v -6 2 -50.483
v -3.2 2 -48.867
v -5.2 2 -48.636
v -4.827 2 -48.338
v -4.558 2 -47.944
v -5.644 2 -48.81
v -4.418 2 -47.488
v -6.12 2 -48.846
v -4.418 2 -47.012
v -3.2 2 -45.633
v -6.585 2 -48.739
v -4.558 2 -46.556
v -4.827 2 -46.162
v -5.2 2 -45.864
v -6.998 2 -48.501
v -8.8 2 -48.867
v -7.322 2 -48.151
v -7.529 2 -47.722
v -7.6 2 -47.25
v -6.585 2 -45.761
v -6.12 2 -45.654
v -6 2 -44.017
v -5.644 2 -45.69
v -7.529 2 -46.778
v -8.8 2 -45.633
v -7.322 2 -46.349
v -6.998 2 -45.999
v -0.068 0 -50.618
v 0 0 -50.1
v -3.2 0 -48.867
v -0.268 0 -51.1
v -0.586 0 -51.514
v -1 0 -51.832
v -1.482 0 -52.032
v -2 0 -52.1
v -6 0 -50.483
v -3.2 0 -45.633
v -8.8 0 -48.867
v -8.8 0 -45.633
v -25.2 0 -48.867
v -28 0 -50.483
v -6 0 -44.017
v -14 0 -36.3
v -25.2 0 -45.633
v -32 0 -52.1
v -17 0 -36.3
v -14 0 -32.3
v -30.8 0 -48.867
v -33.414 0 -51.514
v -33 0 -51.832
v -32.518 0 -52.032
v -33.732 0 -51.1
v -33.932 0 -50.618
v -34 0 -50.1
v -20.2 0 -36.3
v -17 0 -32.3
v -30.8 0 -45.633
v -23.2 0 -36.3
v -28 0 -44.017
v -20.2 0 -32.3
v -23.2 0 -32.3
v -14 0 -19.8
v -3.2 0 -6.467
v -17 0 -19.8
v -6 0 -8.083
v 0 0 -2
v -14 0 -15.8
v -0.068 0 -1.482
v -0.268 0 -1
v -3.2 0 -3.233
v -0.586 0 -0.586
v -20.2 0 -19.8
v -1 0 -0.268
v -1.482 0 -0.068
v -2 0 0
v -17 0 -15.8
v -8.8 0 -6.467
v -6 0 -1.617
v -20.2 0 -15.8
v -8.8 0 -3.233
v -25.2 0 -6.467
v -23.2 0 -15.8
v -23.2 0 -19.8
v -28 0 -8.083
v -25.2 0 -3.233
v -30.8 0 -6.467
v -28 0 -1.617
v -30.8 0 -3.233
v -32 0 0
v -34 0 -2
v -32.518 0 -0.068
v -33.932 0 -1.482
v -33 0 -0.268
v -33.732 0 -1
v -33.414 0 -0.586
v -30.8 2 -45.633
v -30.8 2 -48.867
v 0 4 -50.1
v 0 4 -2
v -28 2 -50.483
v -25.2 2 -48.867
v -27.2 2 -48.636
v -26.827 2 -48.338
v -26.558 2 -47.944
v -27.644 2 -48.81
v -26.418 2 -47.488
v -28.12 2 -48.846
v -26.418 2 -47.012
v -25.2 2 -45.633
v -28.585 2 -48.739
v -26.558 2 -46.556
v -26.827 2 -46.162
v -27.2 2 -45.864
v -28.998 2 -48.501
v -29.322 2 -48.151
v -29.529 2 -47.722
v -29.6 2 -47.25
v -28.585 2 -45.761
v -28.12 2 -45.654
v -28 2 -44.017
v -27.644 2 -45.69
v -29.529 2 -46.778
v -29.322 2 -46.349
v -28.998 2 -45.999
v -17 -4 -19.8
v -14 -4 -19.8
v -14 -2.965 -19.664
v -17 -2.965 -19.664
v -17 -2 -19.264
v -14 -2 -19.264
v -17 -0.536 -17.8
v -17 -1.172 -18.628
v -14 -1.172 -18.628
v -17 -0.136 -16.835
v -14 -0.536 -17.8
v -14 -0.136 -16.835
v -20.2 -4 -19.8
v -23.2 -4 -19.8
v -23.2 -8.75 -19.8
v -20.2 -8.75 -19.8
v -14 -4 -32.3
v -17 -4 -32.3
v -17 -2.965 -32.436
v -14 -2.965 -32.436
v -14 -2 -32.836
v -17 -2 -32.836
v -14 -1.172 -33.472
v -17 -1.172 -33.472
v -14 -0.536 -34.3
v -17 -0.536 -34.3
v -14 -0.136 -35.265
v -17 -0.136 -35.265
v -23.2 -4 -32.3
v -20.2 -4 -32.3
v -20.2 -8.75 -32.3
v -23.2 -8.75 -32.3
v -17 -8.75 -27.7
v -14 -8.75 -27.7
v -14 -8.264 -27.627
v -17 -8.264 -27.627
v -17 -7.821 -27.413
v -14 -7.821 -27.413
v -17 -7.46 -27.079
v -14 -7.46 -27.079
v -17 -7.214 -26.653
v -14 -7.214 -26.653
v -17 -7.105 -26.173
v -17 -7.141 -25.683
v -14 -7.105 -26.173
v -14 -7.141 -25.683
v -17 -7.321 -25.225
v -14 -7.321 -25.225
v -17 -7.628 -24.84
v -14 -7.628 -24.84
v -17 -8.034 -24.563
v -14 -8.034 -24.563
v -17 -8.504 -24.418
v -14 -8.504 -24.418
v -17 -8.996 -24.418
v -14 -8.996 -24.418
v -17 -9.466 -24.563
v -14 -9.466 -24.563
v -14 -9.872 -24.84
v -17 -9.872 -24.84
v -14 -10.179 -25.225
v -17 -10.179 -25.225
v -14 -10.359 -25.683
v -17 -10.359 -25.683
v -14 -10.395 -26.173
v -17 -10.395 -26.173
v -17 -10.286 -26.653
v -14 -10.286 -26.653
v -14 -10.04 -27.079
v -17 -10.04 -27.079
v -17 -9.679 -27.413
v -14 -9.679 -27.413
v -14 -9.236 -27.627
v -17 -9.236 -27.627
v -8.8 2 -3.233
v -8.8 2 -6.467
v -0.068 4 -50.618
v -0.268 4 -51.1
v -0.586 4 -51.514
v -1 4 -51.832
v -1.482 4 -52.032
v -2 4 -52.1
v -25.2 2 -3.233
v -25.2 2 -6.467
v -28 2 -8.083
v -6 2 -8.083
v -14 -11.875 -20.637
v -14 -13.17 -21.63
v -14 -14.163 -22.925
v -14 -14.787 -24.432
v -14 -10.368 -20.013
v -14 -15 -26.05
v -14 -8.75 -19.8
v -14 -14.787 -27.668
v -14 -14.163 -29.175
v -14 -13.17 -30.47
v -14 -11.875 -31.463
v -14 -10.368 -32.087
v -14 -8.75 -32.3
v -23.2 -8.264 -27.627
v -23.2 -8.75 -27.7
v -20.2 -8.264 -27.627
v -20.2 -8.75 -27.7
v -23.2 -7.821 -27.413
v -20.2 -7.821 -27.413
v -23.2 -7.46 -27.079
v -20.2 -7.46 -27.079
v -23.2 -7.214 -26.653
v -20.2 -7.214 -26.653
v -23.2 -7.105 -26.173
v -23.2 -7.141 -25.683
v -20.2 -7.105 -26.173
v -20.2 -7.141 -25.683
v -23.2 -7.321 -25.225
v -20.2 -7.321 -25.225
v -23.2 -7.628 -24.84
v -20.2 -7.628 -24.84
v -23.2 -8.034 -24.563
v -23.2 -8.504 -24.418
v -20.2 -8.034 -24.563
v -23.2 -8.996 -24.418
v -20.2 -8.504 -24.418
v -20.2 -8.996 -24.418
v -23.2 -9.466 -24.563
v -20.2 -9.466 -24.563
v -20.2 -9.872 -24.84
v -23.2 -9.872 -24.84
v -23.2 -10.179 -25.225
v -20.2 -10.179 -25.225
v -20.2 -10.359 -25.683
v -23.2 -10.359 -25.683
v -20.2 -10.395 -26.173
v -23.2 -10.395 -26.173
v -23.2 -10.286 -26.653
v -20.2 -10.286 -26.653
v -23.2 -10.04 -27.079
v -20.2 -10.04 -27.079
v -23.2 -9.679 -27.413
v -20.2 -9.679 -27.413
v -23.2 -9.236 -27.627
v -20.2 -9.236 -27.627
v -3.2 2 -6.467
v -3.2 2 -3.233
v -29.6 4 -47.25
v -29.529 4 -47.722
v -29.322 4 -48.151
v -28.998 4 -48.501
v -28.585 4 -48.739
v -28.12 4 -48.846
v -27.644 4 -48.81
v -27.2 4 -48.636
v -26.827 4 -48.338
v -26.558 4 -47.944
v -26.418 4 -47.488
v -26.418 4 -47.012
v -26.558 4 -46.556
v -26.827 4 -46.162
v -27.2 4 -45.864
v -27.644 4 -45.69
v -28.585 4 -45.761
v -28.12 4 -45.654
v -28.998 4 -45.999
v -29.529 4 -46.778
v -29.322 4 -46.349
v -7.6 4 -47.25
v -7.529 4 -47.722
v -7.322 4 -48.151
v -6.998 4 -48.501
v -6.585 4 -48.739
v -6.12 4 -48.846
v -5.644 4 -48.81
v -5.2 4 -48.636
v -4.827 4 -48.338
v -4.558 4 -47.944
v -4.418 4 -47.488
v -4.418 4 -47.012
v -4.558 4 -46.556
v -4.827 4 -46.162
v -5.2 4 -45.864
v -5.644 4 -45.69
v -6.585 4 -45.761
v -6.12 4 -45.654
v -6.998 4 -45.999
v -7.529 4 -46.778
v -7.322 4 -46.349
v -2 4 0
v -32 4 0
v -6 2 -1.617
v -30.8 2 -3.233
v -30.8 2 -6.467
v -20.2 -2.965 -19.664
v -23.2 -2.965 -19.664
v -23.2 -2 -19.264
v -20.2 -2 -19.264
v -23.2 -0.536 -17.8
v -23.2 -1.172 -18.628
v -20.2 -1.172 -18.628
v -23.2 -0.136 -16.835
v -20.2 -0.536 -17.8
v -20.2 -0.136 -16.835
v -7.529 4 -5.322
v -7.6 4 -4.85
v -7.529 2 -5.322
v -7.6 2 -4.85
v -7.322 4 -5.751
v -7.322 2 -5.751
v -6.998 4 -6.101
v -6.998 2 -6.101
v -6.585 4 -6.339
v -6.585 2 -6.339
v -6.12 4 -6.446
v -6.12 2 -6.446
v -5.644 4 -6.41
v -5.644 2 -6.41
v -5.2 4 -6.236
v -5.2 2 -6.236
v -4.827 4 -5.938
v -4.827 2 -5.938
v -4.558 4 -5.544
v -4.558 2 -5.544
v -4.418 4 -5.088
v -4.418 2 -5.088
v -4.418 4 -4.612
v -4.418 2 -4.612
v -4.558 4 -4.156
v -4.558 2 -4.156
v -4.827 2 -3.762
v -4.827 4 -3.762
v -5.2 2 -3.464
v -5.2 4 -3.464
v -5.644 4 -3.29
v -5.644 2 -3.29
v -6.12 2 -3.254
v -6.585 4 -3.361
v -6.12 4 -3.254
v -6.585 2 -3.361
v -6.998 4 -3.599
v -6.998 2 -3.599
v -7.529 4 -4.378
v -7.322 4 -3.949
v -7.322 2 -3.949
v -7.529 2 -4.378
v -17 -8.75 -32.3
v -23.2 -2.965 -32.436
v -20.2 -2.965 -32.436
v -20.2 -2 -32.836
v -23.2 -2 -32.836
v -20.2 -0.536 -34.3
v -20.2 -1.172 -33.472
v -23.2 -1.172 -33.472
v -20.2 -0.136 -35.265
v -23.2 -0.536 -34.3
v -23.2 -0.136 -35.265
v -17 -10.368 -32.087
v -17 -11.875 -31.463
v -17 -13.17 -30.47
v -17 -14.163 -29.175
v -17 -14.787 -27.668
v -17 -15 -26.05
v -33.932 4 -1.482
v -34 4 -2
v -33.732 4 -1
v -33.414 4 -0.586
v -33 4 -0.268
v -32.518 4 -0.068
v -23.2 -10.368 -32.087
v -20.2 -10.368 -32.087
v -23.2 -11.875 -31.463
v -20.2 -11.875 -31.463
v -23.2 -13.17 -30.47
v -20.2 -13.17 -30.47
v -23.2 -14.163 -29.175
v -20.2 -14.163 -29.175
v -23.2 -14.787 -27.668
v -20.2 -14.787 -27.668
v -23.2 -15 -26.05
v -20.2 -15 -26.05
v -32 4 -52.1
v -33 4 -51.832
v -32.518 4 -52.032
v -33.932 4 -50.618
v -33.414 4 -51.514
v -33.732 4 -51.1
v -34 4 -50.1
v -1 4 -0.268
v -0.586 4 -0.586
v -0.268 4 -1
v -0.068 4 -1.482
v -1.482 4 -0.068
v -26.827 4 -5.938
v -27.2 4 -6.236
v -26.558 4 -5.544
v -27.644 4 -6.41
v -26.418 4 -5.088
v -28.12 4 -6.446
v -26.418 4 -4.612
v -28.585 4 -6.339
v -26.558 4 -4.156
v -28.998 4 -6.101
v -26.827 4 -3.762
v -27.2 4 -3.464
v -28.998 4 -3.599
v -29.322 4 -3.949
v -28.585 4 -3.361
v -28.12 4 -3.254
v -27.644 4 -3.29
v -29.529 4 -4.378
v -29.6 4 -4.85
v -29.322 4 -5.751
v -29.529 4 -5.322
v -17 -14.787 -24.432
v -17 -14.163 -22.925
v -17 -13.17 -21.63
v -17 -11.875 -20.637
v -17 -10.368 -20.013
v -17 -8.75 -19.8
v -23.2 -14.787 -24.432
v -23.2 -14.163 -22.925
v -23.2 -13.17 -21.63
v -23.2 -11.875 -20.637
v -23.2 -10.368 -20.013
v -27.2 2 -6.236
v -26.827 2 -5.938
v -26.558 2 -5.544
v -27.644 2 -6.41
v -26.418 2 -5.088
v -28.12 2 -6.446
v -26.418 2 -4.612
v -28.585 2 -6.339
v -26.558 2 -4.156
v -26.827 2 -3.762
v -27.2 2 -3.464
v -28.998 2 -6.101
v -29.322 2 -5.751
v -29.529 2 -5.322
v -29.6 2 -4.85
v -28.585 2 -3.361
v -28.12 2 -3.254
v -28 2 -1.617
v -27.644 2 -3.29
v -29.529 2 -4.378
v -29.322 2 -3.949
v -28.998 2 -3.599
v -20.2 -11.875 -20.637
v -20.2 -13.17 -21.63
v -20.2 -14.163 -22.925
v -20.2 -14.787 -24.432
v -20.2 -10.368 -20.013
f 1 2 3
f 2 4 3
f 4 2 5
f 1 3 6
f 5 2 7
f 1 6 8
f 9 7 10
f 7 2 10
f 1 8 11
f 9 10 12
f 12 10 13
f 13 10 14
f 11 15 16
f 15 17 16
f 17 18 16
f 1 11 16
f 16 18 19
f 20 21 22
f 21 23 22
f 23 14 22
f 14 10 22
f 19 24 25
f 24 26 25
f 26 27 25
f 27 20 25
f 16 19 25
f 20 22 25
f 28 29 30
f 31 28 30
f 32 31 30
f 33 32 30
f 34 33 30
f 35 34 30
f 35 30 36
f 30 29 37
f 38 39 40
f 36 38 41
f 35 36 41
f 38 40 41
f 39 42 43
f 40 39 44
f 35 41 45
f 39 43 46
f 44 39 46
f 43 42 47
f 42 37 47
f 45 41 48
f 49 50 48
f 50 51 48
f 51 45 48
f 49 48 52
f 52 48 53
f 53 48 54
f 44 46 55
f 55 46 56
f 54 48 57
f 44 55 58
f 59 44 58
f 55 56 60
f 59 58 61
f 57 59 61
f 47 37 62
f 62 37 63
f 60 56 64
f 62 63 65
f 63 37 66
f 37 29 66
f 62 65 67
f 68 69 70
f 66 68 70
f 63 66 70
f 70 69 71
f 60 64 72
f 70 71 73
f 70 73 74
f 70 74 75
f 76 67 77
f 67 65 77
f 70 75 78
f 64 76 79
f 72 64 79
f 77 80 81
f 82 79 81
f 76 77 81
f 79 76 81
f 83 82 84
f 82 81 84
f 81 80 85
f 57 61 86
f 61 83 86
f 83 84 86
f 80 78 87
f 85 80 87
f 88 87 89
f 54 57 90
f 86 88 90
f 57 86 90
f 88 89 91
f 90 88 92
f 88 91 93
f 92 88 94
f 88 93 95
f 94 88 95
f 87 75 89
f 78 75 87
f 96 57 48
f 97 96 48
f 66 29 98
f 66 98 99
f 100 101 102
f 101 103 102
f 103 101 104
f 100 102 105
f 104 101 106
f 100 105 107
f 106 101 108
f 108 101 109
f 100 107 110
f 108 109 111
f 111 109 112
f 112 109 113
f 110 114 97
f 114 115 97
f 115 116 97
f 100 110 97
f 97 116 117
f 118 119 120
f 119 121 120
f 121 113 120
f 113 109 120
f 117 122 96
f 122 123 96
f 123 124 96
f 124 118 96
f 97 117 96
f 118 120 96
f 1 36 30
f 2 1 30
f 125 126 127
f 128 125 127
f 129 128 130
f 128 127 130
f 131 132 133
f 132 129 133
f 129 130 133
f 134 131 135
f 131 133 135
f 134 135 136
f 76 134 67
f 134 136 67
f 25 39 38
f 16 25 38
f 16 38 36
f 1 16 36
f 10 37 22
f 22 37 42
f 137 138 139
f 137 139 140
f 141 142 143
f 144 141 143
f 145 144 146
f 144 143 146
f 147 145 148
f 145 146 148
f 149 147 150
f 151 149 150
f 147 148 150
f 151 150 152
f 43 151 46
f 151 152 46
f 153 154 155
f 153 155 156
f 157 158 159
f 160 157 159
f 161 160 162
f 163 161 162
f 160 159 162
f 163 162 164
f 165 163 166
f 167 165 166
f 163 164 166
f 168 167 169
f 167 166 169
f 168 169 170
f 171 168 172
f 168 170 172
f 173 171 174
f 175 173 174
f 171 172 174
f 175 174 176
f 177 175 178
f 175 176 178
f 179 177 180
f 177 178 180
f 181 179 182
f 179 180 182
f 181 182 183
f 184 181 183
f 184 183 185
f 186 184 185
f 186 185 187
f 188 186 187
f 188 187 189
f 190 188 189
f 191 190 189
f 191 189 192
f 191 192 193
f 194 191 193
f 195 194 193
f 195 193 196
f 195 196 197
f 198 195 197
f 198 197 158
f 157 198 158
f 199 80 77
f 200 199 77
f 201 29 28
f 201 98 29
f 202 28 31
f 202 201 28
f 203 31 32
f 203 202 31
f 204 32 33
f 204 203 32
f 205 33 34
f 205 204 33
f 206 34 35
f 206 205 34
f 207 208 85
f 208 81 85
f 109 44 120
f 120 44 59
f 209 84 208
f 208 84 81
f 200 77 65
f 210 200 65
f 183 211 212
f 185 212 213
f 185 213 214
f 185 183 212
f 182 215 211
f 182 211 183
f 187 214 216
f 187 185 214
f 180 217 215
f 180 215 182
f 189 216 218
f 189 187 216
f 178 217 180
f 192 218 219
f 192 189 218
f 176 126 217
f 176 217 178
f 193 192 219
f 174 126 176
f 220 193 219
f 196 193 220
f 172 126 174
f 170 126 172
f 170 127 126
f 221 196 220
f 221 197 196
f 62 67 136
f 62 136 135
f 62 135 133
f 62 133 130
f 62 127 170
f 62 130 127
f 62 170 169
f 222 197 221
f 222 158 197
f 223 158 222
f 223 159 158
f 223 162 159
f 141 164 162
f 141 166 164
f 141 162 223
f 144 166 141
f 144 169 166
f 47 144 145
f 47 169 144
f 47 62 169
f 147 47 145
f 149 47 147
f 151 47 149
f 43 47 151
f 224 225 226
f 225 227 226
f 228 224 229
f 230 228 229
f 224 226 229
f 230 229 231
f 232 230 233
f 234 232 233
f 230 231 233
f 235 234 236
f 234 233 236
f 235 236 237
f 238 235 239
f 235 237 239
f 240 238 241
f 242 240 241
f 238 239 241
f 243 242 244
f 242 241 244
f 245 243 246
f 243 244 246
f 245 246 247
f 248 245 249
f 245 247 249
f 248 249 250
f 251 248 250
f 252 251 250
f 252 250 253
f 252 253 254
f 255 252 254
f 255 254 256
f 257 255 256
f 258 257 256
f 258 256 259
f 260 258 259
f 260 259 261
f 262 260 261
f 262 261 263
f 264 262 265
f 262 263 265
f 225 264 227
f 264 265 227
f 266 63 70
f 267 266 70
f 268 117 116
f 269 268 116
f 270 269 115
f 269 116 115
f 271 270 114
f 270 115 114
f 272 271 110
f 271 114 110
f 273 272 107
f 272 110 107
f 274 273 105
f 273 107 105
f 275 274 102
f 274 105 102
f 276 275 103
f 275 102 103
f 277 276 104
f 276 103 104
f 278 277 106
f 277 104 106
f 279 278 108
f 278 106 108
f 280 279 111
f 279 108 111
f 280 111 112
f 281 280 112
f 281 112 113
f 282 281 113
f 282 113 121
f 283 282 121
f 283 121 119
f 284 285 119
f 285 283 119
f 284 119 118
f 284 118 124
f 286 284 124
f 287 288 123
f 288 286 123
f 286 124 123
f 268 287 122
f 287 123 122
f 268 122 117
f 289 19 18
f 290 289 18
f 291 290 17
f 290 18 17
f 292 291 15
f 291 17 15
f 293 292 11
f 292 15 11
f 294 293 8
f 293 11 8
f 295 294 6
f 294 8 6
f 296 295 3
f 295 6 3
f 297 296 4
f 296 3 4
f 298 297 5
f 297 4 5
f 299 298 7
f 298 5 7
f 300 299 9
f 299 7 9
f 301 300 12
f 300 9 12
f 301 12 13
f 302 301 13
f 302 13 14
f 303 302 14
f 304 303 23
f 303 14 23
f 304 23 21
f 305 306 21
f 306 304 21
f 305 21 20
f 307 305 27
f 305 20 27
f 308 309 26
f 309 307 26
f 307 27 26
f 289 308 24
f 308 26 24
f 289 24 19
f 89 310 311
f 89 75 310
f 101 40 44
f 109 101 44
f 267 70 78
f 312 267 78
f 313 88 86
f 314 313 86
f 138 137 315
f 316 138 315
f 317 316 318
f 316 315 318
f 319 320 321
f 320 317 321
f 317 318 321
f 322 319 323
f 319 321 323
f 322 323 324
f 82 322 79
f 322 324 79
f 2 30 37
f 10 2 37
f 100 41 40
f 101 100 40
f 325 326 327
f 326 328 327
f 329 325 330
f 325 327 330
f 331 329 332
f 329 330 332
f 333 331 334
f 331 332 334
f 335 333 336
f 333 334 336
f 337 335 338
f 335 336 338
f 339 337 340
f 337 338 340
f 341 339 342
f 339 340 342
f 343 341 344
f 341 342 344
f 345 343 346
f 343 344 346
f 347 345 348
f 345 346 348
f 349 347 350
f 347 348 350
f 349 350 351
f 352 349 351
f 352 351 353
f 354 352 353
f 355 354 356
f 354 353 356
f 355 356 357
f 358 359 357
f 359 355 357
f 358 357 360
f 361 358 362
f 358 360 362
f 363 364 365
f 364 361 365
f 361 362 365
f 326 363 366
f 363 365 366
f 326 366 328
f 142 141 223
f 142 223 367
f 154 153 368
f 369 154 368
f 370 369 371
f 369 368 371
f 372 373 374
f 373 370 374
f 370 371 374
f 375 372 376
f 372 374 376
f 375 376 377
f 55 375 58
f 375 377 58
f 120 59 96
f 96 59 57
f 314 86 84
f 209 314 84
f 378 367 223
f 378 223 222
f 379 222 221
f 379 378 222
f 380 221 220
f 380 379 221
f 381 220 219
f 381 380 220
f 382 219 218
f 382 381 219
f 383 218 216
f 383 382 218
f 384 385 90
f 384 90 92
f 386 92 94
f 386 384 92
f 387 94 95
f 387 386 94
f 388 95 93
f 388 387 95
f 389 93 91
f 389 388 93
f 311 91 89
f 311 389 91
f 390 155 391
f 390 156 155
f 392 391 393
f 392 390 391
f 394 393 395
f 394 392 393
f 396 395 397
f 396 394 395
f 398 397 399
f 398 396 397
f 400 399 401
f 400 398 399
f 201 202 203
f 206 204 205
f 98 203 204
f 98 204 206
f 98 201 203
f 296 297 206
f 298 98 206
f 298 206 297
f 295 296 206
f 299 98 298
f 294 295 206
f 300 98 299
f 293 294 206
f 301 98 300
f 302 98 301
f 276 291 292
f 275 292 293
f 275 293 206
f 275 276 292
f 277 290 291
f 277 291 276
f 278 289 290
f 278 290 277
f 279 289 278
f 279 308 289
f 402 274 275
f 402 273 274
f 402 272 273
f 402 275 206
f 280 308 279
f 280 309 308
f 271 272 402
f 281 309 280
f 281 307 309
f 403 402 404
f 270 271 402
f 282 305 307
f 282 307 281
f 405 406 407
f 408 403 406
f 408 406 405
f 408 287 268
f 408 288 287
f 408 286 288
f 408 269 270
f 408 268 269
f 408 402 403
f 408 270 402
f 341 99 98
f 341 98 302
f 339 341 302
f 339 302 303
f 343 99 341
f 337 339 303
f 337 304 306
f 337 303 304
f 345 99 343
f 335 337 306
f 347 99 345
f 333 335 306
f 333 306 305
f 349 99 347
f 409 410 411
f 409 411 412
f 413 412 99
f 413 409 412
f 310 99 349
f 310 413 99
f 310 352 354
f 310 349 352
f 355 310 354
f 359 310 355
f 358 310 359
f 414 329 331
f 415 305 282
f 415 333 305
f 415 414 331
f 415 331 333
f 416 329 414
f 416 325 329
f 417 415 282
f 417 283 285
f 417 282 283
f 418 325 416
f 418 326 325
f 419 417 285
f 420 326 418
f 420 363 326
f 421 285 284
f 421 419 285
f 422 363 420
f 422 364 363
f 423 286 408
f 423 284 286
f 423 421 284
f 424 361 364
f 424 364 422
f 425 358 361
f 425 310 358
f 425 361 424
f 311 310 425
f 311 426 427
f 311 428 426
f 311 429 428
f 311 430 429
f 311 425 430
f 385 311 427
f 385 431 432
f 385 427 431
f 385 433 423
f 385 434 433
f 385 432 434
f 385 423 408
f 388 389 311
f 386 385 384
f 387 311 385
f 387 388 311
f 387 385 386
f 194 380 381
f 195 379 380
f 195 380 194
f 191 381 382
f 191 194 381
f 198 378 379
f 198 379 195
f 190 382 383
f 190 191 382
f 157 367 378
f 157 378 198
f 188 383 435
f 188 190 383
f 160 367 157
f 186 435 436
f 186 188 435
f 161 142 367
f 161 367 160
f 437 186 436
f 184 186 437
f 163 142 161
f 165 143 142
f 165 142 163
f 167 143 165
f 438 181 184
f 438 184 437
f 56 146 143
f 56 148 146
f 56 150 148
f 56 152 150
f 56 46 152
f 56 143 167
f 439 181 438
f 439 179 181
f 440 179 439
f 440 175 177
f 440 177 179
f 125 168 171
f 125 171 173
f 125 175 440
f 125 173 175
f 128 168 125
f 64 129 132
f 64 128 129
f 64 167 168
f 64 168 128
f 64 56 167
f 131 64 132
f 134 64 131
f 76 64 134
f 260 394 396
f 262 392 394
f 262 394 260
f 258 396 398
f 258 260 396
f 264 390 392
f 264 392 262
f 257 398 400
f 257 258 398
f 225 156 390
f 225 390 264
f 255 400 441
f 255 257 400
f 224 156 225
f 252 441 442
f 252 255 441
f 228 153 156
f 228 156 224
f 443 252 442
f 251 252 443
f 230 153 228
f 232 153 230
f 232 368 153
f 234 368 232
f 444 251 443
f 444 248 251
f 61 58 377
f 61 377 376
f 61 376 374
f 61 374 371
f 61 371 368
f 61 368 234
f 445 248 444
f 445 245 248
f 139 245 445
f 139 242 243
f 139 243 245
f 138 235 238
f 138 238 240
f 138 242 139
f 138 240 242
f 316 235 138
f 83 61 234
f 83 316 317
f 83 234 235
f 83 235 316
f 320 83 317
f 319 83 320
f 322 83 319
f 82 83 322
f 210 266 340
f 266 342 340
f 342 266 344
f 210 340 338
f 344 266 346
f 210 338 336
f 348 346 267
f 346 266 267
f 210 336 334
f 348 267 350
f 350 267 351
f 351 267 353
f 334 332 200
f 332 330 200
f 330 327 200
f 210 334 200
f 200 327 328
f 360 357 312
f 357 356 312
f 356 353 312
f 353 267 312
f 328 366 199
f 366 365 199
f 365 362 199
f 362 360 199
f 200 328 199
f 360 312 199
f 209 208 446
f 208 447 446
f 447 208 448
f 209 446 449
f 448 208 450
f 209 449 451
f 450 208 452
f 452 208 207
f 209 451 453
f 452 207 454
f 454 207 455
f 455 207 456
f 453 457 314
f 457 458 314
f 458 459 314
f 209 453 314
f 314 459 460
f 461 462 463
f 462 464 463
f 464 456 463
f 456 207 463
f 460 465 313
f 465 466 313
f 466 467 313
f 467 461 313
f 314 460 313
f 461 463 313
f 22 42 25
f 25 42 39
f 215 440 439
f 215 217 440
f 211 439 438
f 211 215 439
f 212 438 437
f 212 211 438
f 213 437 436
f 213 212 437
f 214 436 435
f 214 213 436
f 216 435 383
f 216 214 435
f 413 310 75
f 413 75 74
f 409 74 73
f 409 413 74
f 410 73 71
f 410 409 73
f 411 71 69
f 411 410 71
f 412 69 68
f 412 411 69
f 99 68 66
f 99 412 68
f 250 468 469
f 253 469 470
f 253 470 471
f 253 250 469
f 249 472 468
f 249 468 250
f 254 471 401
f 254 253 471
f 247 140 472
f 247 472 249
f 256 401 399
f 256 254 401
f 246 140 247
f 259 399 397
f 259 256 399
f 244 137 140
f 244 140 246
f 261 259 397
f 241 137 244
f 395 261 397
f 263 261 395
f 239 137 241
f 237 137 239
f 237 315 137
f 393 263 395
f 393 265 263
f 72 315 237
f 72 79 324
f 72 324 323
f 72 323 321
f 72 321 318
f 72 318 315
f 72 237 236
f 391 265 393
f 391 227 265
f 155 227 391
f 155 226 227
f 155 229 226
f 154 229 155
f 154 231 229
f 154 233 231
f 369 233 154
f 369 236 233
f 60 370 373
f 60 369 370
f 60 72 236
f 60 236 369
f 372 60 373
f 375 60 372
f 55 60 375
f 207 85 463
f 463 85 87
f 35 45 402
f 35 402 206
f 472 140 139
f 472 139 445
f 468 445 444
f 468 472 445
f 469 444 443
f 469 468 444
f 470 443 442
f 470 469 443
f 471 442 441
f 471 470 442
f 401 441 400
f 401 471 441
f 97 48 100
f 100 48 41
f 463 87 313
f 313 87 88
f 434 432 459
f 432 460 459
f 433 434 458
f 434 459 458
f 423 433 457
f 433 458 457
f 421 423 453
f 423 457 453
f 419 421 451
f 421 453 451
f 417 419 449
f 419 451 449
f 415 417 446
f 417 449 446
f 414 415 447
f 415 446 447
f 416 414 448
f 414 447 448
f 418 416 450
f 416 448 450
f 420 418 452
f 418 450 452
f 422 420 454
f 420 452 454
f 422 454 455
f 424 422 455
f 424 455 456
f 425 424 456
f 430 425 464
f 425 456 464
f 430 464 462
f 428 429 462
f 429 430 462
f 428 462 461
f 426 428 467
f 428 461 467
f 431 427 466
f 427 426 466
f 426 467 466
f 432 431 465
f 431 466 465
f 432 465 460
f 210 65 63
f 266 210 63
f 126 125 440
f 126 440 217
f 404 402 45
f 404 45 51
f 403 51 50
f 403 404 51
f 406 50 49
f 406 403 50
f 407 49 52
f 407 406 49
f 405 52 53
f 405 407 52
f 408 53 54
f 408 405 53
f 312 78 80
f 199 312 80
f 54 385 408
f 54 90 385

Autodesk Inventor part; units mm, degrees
ref_plane "YZ Plane" through (0, 0, 0) normal (1, 0, 0) x (0, 1, 0)
ref_plane "XZ Plane" through (0, 0, 0) normal (0, 1, 0) x (-1, 0, 0)
ref_plane "XY Plane" through (0, 0, 0) normal (0, 0, 1) x (1, 0, 0)
sketch "Sketch1" plane through (0, 0, 0) normal (0, 1, 0) x (-1, 0, 0)
  line L0 (0, 0) -> (34, 0)
  line L1 (34, 0) -> (34, -52.1)
  line L2 (34, -52.1) -> (0, -52.1)
  line L3 (0, -52.1) -> (0, 0)
  circle A0 centre (28, -4.85) radius 1.6
  line L4 (28, -8.0832) -> (25.2, -6.4666)
  line L5 (25.2, -6.4666) -> (25.2, -3.2334)
  line L6 (25.2, -3.2334) -> (28, -1.6168)
  line L7 (28, -1.6168) -> (30.8, -3.2334)
  line L8 (30.8, -3.2334) -> (30.8, -6.4666)
  line L9 (30.8, -6.4666) -> (28, -8.0832)
  line L10 (17, 0) -> (17, -52.1) construction
  line L11 (0, -26.05) -> (34, -26.05) construction
  line L12 (17, -19.8) -> (14, -19.8)
  line L13 (14, -19.8) -> (14, -32.3)
  line L14 (14, -32.3) -> (17, -32.3)
  line L15 (17, -32.3) -> (17, -19.8)
  line L16 (23.2, -19.8) -> (20.2, -19.8)
  line L17 (20.2, -19.8) -> (20.2, -32.3)
  line L18 (20.2, -32.3) -> (23.2, -32.3)
  line L19 (23.2, -32.3) -> (23.2, -19.8)
  dimension "d0" = 34
  dimension "d1" = 52.1
  dimension "d2" = 3.2
  dimension "d3" = 4.85
  dimension "d4" = 6
  dimension "d5" = 5.6
  dimension "d18" = 3
  dimension "d19" = 12.5
  dimension "d20" = 3
  dimension "d21" = 12.5
  dimension "d22" = 19.8
  dimension "d23" = 3.2
extrude "Extrusion1" add sketch "Sketch1" along normal blind 4 contours L0 L1 L2 L3 | A0 | L4 L5 L6 L7 L8 L9 | L15 L14 L13 L12 | L19 L18 L17 L16
extrude "Extrusion2" cut sketch "Sketch1" along normal blind 2 contours L4 L5 L6 L7 L8 L9
extrude "Extrusion3" cut sketch "Sketch1" along normal blind 4 contours A0
pattern_linear "Rectangular Pattern1" count 2 spacing 42.4 along (0, 0, -1) count 2 spacing 22 along (1, 0, 0) of "Extrusion3", "Extrusion2"
extrude "Extrusion4" add sketch "Sketch1" against normal blind 15 contours L15 L14 L13 L12 | L19 L18 L17 L16
sketch "Sketch2" plane through (-14, -15, -19.8) normal (1, 0, 0) x (0, 0, -1)
  line L0 (0, 15) -> (12.5, 15) projected
  line L1 (0, 15) -> (0, 0) projected
  line L2 (12.5, 0) -> (0, 0) projected
  line L3 (12.5, 15) -> (12.5, 0) projected
  circle A0 centre (6.25, 6.25) radius 1.65
  point P0 (-19.8, 15)
  dimension "d26" = 3.3
  dimension "d27" = 12.5
  dimension "d28" = 6.25
  dimension "d29" = 6.25
extrude "Extrusion5" cut sketch "Sketch2" against normal up to surface (9.2 mm away) contours A0
fillet "Fillet1" radius 6.25 4 edges at (-15.5, -15, -19.8) (-15.5, -15, -32.3) (-21.7, -15, -19.8) (-21.7, -15, -32.3)
fillet "Fillet2" radius 4 4 edges at (-15.5, 0, -19.8) (-15.5, 0, -32.3) (-21.7, 0, -19.8) (-21.7, 0, -32.3)
fillet "Fillet3" radius 2 4 edges at (-34, 2, 0) (-34, 2, -52.1) (0, 2, 0) (0, 2, -52.1)
equation "\"d22\" = -0.5 * d19 + 0.5 * d1"
equation "\"d28\" = 0.5 * d27"
equation "\"d29\" = d28"
properties part number "encaixeDuplo"
